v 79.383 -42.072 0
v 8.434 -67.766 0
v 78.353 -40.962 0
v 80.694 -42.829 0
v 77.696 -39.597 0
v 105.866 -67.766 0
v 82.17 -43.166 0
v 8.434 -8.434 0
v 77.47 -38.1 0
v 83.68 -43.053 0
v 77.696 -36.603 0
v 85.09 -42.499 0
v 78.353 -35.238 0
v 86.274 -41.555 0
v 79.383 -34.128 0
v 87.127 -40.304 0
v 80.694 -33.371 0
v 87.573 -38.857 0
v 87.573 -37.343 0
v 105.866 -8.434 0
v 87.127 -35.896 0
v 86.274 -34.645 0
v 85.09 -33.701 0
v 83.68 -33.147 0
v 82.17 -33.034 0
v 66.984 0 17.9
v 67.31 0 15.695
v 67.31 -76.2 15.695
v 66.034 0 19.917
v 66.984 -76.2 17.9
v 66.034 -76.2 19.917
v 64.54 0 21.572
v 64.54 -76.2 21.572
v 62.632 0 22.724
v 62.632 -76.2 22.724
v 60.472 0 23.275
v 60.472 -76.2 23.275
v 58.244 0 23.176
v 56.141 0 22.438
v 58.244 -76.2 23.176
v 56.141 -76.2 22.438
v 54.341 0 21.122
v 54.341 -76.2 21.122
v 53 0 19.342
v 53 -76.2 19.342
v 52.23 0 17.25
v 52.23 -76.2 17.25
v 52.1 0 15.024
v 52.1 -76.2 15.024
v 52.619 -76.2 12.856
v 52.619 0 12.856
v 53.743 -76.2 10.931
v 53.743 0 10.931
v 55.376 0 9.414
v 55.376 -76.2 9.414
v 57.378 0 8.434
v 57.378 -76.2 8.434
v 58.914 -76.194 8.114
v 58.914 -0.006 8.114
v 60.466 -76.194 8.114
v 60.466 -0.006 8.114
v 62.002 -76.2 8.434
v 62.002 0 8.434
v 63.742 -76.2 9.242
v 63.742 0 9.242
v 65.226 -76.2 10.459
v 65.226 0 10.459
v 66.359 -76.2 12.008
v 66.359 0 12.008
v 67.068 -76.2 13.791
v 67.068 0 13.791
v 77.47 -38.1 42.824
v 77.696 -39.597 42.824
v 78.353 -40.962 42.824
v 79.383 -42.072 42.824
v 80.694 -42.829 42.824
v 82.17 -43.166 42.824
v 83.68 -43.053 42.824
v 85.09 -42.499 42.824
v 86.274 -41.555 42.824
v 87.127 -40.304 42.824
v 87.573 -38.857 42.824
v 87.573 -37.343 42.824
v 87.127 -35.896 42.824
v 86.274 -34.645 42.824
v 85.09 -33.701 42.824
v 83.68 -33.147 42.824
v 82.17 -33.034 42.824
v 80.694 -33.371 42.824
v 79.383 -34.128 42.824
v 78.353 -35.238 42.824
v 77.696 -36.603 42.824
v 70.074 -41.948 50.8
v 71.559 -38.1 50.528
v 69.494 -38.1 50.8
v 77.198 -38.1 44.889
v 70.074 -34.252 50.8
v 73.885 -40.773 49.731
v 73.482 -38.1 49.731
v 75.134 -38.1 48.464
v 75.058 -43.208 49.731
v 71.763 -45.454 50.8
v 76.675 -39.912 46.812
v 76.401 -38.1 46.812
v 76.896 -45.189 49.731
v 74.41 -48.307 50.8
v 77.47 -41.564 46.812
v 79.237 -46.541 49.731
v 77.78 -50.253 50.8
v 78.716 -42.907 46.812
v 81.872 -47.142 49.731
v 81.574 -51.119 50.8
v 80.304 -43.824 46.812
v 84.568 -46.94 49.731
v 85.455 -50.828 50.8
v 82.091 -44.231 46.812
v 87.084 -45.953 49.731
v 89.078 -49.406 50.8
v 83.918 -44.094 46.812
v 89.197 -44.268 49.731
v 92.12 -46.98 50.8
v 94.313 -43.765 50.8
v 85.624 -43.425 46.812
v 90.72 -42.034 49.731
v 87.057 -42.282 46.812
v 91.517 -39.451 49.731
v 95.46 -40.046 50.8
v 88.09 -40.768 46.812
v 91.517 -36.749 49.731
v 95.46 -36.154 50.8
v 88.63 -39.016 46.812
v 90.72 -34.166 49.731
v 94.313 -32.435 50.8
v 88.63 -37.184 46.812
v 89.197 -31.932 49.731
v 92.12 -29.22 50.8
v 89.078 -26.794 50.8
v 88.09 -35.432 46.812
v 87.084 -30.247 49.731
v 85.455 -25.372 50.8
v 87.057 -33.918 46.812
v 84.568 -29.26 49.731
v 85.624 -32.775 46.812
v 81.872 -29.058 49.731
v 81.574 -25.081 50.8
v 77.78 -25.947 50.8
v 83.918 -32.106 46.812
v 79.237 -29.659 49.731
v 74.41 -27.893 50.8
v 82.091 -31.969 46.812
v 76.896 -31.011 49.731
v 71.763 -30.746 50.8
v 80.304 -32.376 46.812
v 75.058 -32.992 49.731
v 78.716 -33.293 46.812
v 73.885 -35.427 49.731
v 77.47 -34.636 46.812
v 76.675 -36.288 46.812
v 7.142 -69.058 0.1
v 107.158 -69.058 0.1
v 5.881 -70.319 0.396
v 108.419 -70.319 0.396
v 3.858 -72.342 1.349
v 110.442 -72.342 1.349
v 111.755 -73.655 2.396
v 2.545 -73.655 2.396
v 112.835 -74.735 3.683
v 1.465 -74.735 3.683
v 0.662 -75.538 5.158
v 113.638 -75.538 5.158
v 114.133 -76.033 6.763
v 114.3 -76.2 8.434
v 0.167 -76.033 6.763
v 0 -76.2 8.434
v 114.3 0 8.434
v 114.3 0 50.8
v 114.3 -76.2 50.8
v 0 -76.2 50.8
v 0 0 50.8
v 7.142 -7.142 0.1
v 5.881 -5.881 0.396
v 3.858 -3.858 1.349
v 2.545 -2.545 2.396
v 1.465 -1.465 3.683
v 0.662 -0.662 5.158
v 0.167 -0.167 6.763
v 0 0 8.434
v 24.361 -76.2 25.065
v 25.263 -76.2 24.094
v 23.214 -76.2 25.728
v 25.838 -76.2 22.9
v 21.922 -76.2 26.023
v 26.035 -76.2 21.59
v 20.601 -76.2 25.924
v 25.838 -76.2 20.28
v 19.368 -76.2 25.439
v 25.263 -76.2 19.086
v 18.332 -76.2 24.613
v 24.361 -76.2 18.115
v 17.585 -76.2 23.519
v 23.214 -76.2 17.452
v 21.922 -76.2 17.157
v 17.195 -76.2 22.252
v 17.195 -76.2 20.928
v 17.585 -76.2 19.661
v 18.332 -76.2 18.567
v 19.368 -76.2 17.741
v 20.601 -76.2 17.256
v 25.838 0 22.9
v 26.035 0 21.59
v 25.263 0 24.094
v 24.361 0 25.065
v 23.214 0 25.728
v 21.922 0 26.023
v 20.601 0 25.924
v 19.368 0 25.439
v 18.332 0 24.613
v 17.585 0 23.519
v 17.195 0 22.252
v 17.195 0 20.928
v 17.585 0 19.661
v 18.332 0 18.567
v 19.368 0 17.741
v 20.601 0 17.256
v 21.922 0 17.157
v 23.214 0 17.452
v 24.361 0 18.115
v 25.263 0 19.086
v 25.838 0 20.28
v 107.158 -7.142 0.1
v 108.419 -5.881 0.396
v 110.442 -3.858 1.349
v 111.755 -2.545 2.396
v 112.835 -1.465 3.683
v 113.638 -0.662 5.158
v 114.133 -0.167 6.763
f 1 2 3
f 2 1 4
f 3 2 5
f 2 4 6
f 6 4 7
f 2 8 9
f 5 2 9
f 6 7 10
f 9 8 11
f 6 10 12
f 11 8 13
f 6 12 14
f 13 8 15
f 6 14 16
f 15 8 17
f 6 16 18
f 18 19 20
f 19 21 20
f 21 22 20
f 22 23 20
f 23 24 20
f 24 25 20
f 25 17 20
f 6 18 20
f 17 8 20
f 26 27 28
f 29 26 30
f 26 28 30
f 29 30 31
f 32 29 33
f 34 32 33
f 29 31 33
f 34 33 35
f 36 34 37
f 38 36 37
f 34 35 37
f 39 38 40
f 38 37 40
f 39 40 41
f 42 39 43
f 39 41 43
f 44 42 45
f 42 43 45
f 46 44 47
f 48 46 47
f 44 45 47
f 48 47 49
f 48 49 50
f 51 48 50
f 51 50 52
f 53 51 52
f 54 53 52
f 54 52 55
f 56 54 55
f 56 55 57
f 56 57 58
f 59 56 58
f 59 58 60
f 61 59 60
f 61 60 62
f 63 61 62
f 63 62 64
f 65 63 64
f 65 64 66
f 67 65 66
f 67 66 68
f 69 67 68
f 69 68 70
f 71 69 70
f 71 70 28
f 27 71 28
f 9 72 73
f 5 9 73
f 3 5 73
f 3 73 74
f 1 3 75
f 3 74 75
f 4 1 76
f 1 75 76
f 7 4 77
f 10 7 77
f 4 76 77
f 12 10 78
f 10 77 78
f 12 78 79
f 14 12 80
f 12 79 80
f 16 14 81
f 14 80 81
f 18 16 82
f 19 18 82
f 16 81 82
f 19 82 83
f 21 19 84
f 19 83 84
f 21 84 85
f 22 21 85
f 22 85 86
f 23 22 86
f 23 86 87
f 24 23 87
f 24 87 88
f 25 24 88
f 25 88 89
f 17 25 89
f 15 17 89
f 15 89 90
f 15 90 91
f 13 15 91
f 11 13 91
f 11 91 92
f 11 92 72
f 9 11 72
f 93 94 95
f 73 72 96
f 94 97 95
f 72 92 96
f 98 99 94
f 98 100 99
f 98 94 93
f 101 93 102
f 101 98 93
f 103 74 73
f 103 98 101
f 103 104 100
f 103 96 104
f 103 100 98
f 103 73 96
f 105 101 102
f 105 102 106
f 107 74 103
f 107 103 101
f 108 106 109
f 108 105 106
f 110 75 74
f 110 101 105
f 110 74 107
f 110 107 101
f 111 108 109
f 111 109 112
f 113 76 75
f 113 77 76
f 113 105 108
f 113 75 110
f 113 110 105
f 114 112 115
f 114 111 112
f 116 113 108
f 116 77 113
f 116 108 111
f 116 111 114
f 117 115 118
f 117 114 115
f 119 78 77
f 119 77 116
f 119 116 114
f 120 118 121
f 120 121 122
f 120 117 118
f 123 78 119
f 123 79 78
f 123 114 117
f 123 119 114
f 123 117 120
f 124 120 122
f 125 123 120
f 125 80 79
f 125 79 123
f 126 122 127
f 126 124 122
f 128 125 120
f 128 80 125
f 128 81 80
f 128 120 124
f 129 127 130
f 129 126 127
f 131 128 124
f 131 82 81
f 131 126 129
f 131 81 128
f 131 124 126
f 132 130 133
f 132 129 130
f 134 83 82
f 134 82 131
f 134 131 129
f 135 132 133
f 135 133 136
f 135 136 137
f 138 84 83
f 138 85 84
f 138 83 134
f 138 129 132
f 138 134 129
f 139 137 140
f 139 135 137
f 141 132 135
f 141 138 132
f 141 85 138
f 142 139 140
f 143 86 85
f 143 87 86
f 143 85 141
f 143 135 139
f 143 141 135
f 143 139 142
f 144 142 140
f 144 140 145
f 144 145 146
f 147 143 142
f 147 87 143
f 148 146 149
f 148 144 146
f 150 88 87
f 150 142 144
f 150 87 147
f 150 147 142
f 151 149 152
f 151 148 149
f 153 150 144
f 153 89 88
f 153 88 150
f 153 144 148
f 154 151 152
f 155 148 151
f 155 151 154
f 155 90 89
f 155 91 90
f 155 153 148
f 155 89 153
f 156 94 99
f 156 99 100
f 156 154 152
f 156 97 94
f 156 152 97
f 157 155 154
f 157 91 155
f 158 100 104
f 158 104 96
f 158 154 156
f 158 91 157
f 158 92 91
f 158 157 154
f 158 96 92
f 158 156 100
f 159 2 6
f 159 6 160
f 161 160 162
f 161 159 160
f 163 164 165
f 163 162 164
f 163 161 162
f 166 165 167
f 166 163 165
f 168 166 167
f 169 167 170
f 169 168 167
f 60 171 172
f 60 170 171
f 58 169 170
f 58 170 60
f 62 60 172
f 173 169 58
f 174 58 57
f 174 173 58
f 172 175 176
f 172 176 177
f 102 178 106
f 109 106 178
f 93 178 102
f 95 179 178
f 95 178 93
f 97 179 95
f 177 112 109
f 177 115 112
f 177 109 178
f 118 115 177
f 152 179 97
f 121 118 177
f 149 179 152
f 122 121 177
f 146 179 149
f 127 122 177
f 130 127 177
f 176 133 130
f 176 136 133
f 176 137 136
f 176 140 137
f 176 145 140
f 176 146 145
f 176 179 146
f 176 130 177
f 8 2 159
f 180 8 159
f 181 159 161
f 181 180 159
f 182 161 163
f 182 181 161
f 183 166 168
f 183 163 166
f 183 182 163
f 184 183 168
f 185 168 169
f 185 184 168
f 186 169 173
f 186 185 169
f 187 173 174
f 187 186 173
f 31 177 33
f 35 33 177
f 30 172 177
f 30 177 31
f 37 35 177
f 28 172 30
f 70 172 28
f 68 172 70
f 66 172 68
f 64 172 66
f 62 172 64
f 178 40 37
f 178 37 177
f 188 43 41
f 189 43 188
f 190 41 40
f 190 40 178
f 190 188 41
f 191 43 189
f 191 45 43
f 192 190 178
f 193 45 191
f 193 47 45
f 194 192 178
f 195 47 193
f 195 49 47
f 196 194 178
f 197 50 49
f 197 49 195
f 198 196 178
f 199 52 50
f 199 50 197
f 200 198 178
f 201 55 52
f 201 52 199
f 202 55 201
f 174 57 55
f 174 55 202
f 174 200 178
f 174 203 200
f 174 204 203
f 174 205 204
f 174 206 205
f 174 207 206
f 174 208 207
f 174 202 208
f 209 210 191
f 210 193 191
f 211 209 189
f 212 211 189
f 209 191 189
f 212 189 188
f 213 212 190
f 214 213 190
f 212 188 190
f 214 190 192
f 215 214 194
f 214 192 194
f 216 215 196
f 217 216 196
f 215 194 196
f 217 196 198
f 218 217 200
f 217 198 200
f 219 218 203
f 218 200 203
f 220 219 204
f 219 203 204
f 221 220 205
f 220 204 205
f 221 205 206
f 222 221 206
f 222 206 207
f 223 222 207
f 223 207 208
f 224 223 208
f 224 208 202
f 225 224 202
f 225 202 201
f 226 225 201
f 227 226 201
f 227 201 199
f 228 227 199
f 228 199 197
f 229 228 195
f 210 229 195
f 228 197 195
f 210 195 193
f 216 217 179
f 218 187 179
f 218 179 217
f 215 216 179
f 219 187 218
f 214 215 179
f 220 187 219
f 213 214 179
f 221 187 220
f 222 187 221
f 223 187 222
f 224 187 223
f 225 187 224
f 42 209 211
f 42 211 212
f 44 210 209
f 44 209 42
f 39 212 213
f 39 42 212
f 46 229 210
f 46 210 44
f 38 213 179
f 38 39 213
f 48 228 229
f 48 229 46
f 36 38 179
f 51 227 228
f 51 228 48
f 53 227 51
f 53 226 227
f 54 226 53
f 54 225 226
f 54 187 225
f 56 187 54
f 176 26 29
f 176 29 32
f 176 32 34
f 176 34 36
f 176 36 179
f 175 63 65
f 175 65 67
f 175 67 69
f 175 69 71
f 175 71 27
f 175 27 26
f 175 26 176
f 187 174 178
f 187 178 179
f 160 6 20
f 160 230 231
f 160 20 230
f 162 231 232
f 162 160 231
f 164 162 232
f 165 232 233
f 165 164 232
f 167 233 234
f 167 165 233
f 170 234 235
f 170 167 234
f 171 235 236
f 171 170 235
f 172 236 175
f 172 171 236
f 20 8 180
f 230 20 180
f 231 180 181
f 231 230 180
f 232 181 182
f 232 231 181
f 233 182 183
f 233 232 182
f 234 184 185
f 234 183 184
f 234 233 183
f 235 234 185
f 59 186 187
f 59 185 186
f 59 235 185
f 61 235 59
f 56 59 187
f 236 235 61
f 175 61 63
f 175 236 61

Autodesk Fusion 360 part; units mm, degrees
sketch "Sketch1" plane through (0, 0, 0) normal (0, 0, 1) x (1, 0, 0)
  line L0 (0, 0) -> (114.3, 0)
  line L1 (114.3, 0) -> (114.3, -76.2)
  line L2 (114.3, -76.2) -> (0, -76.2)
  line L3 (0, -76.2) -> (0, 0)
  dimension "d1" = 114.3
  dimension "d2" = 76.2
extrude "Extrude1" add sketch "Sketch1" along normal blind 50.8
sketch "Sketch2" plane through (0, 0, 50.8) normal (0, 0, 1) x (-1, 0, 0)
  line L0 (0, 76.2) -> (-114.3, 76.2)
  line L1 (-114.3, 76.2) -> (-114.3, 0)
  line L2 (-114.3, 0) -> (0, 0)
  line L3 (0, 0) -> (0, 76.2)
  circle A0 centre (-82.55, 38.1) radius 5.08
  dimension "d5" = 10.16
  dimension "d6" = 38.1
  dimension "d7" = 31.75
extrude "Extrude2" cut sketch "Sketch2" against normal blind 50.8 contours A0
fillet "Fillet1" radius 7.9756 1 edges at (87.2862, -39.937, 50.8)
fillet "Fillet2" radius 8.4339 4 edges at (114.3, -38.1, 0) (57.15, -76.2, 0) (0, -38.1, 0) (57.15, 0, 0)
sketch "Sketch3" plane through (0, -76.2, 0) normal (0, -1, 0) x (1, 0, 0)
  line L0 (0, 8.4339) -> (114.3, 8.4339)
  line L1 (114.3, 8.4339) -> (114.3, 50.8)
  line L2 (114.3, 50.8) -> (0, 50.8)
  line L3 (0, 50.8) -> (0, 8.4339)
  circle A0 centre (21.59, 21.59) radius 4.445
  line L4 (8.4339, 0) -> (105.8661, 0)
  circle A1 centre (59.69, 15.6948) radius 7.62
  dimension "d20" = 8.89
  dimension "d21" = 21.59
  dimension "d22" = 21.59
  dimension "d23" = 15.24
  dimension "d24" = 59.69
extrude "Extrude4" cut sketch "Sketch3" against normal blind 76.2 contours L0 A1 | L0 A1
extrude "Extrude5" cut sketch "Sketch3" against normal blind 76.2 contours A0
